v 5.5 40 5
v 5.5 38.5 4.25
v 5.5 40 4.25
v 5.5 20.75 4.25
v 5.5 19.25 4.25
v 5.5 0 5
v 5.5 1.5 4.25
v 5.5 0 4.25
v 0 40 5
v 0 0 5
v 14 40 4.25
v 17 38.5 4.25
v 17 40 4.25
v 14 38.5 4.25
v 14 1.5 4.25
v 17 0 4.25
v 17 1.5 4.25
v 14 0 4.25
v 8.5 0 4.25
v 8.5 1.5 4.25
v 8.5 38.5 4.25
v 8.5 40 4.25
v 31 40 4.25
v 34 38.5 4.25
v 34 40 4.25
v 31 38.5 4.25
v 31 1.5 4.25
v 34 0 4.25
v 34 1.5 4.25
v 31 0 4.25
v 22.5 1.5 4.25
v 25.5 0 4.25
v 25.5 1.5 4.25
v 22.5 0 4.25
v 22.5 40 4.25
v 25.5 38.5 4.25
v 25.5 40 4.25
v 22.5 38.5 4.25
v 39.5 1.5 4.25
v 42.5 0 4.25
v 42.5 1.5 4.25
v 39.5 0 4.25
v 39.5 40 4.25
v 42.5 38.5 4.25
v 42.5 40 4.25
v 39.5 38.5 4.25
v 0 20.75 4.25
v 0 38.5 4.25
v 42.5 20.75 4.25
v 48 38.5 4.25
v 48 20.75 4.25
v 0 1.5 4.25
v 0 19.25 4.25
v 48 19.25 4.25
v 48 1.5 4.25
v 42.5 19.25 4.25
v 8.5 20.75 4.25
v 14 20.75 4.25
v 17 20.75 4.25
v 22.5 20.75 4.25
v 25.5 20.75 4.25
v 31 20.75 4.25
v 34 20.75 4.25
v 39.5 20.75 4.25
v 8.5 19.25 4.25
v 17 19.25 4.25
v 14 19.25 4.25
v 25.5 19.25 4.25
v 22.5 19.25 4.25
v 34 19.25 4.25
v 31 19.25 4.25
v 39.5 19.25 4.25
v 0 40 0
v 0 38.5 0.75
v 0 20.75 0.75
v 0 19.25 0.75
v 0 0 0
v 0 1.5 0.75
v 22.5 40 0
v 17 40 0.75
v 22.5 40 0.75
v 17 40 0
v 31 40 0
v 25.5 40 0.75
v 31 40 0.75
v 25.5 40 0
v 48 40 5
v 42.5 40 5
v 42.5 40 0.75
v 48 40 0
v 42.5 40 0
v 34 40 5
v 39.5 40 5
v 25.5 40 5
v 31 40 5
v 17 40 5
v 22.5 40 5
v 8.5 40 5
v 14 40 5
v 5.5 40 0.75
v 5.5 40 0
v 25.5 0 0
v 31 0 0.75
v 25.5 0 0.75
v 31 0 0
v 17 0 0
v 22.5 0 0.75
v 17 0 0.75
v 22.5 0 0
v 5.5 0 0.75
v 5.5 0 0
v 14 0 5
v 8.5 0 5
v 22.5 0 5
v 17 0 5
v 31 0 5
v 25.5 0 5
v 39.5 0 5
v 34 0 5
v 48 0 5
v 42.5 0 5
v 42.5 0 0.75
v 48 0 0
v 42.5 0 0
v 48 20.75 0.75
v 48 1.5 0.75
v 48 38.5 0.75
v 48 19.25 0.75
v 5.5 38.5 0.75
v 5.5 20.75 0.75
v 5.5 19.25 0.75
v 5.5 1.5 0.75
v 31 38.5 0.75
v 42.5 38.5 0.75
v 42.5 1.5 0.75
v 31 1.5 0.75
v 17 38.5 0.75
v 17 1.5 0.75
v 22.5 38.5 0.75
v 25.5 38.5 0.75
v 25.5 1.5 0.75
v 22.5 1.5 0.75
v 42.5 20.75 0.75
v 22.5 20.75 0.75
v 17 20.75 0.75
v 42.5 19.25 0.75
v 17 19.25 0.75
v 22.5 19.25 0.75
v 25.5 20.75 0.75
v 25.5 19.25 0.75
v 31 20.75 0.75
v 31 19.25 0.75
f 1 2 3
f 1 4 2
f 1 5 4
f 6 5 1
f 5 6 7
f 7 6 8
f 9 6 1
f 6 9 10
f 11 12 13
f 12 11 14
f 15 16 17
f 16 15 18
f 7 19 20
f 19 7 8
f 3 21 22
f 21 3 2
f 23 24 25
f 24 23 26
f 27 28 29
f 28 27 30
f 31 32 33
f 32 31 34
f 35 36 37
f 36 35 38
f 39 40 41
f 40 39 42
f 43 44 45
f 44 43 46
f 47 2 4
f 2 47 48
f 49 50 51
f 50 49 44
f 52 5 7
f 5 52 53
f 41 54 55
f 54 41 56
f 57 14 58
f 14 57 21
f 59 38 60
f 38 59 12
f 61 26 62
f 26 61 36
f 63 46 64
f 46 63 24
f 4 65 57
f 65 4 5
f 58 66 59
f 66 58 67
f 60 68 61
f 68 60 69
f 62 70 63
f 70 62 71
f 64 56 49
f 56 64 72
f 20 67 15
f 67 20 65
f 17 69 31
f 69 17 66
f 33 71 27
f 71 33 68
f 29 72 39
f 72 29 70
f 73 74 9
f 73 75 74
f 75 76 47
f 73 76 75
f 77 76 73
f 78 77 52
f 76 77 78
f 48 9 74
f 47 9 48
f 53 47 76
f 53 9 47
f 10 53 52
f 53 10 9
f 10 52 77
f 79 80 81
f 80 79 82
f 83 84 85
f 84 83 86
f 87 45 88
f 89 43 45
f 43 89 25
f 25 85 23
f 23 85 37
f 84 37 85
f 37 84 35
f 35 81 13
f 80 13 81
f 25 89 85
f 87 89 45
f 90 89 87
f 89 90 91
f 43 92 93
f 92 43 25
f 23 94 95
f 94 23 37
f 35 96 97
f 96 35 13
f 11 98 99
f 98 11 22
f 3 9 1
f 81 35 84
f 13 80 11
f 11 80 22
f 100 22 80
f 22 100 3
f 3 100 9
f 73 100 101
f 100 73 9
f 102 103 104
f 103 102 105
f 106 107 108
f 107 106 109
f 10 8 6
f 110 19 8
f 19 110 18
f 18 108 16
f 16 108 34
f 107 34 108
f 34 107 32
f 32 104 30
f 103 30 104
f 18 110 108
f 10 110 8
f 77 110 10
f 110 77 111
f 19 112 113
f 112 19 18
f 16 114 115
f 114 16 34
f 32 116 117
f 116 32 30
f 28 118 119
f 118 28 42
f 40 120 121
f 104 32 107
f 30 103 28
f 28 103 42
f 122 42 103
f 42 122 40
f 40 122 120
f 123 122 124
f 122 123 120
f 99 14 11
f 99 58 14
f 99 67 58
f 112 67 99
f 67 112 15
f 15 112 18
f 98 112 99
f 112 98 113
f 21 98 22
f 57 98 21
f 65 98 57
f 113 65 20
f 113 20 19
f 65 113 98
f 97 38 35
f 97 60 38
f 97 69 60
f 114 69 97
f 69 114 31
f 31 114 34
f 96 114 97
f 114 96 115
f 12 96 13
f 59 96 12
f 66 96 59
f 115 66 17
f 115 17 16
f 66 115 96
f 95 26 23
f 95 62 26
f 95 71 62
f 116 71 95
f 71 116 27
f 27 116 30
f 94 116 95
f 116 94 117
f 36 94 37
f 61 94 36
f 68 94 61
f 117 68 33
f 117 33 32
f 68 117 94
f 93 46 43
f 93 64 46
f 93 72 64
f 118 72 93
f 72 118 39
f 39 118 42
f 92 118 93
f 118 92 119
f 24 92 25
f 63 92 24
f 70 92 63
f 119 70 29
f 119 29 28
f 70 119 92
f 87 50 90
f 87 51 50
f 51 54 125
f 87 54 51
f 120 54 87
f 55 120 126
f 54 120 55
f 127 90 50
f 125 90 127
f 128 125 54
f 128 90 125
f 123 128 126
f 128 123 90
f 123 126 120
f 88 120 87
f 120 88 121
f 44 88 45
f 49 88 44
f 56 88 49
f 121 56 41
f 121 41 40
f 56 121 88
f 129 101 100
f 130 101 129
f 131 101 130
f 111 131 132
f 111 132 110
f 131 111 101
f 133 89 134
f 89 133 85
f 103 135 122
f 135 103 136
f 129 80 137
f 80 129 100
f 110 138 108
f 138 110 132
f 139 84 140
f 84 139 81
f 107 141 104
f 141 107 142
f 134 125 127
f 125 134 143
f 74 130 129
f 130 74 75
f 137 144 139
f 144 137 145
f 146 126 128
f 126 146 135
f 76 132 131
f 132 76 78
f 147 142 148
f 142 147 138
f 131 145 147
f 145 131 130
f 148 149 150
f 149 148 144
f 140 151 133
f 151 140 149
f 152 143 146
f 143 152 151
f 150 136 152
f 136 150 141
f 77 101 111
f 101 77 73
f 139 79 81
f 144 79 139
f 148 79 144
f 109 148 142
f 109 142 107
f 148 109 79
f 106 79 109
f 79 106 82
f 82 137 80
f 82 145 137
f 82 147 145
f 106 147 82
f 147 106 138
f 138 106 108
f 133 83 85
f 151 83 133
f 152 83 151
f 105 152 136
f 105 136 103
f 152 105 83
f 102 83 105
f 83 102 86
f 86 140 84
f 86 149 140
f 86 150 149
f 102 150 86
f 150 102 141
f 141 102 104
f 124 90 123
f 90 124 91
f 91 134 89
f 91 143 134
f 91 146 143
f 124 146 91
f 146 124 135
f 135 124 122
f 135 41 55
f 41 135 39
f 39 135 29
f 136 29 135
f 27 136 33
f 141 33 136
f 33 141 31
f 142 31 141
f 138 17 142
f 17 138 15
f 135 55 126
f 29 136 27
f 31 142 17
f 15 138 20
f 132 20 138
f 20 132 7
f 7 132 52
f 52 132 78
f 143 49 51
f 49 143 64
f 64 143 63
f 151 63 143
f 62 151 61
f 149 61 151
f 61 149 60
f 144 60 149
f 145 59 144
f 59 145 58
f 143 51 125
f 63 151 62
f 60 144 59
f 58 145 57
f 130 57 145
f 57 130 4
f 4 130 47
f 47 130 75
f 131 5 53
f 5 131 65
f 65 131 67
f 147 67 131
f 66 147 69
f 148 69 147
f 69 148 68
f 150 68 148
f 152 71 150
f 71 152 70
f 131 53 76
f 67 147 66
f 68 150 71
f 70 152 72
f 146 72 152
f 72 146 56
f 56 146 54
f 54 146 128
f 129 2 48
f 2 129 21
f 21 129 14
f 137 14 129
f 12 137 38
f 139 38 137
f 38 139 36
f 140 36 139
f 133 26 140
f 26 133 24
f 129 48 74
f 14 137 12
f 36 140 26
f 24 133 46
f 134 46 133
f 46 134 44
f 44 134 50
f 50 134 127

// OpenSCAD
module beam() {
    cube([48, 1.5, 3.5]);
}

module board(position) {
    translate([position * 8.5, 0]) {
        cube([5.5, 40, 0.75]);
    }
}

module palette() {
    board(0);
    board(2);
    board(3);
    board(5);
    translate([0, 0, 4.25]) {
        for (i = [0:5]) {
            board(i);
        }
    }
    translate([0, 0, .75]) {
        beam();
    }
    translate([0, 19.25, .75]) {
        beam();
    }
    translate([0, 38.5, .75]) {
        beam();
    }
}


palette();
